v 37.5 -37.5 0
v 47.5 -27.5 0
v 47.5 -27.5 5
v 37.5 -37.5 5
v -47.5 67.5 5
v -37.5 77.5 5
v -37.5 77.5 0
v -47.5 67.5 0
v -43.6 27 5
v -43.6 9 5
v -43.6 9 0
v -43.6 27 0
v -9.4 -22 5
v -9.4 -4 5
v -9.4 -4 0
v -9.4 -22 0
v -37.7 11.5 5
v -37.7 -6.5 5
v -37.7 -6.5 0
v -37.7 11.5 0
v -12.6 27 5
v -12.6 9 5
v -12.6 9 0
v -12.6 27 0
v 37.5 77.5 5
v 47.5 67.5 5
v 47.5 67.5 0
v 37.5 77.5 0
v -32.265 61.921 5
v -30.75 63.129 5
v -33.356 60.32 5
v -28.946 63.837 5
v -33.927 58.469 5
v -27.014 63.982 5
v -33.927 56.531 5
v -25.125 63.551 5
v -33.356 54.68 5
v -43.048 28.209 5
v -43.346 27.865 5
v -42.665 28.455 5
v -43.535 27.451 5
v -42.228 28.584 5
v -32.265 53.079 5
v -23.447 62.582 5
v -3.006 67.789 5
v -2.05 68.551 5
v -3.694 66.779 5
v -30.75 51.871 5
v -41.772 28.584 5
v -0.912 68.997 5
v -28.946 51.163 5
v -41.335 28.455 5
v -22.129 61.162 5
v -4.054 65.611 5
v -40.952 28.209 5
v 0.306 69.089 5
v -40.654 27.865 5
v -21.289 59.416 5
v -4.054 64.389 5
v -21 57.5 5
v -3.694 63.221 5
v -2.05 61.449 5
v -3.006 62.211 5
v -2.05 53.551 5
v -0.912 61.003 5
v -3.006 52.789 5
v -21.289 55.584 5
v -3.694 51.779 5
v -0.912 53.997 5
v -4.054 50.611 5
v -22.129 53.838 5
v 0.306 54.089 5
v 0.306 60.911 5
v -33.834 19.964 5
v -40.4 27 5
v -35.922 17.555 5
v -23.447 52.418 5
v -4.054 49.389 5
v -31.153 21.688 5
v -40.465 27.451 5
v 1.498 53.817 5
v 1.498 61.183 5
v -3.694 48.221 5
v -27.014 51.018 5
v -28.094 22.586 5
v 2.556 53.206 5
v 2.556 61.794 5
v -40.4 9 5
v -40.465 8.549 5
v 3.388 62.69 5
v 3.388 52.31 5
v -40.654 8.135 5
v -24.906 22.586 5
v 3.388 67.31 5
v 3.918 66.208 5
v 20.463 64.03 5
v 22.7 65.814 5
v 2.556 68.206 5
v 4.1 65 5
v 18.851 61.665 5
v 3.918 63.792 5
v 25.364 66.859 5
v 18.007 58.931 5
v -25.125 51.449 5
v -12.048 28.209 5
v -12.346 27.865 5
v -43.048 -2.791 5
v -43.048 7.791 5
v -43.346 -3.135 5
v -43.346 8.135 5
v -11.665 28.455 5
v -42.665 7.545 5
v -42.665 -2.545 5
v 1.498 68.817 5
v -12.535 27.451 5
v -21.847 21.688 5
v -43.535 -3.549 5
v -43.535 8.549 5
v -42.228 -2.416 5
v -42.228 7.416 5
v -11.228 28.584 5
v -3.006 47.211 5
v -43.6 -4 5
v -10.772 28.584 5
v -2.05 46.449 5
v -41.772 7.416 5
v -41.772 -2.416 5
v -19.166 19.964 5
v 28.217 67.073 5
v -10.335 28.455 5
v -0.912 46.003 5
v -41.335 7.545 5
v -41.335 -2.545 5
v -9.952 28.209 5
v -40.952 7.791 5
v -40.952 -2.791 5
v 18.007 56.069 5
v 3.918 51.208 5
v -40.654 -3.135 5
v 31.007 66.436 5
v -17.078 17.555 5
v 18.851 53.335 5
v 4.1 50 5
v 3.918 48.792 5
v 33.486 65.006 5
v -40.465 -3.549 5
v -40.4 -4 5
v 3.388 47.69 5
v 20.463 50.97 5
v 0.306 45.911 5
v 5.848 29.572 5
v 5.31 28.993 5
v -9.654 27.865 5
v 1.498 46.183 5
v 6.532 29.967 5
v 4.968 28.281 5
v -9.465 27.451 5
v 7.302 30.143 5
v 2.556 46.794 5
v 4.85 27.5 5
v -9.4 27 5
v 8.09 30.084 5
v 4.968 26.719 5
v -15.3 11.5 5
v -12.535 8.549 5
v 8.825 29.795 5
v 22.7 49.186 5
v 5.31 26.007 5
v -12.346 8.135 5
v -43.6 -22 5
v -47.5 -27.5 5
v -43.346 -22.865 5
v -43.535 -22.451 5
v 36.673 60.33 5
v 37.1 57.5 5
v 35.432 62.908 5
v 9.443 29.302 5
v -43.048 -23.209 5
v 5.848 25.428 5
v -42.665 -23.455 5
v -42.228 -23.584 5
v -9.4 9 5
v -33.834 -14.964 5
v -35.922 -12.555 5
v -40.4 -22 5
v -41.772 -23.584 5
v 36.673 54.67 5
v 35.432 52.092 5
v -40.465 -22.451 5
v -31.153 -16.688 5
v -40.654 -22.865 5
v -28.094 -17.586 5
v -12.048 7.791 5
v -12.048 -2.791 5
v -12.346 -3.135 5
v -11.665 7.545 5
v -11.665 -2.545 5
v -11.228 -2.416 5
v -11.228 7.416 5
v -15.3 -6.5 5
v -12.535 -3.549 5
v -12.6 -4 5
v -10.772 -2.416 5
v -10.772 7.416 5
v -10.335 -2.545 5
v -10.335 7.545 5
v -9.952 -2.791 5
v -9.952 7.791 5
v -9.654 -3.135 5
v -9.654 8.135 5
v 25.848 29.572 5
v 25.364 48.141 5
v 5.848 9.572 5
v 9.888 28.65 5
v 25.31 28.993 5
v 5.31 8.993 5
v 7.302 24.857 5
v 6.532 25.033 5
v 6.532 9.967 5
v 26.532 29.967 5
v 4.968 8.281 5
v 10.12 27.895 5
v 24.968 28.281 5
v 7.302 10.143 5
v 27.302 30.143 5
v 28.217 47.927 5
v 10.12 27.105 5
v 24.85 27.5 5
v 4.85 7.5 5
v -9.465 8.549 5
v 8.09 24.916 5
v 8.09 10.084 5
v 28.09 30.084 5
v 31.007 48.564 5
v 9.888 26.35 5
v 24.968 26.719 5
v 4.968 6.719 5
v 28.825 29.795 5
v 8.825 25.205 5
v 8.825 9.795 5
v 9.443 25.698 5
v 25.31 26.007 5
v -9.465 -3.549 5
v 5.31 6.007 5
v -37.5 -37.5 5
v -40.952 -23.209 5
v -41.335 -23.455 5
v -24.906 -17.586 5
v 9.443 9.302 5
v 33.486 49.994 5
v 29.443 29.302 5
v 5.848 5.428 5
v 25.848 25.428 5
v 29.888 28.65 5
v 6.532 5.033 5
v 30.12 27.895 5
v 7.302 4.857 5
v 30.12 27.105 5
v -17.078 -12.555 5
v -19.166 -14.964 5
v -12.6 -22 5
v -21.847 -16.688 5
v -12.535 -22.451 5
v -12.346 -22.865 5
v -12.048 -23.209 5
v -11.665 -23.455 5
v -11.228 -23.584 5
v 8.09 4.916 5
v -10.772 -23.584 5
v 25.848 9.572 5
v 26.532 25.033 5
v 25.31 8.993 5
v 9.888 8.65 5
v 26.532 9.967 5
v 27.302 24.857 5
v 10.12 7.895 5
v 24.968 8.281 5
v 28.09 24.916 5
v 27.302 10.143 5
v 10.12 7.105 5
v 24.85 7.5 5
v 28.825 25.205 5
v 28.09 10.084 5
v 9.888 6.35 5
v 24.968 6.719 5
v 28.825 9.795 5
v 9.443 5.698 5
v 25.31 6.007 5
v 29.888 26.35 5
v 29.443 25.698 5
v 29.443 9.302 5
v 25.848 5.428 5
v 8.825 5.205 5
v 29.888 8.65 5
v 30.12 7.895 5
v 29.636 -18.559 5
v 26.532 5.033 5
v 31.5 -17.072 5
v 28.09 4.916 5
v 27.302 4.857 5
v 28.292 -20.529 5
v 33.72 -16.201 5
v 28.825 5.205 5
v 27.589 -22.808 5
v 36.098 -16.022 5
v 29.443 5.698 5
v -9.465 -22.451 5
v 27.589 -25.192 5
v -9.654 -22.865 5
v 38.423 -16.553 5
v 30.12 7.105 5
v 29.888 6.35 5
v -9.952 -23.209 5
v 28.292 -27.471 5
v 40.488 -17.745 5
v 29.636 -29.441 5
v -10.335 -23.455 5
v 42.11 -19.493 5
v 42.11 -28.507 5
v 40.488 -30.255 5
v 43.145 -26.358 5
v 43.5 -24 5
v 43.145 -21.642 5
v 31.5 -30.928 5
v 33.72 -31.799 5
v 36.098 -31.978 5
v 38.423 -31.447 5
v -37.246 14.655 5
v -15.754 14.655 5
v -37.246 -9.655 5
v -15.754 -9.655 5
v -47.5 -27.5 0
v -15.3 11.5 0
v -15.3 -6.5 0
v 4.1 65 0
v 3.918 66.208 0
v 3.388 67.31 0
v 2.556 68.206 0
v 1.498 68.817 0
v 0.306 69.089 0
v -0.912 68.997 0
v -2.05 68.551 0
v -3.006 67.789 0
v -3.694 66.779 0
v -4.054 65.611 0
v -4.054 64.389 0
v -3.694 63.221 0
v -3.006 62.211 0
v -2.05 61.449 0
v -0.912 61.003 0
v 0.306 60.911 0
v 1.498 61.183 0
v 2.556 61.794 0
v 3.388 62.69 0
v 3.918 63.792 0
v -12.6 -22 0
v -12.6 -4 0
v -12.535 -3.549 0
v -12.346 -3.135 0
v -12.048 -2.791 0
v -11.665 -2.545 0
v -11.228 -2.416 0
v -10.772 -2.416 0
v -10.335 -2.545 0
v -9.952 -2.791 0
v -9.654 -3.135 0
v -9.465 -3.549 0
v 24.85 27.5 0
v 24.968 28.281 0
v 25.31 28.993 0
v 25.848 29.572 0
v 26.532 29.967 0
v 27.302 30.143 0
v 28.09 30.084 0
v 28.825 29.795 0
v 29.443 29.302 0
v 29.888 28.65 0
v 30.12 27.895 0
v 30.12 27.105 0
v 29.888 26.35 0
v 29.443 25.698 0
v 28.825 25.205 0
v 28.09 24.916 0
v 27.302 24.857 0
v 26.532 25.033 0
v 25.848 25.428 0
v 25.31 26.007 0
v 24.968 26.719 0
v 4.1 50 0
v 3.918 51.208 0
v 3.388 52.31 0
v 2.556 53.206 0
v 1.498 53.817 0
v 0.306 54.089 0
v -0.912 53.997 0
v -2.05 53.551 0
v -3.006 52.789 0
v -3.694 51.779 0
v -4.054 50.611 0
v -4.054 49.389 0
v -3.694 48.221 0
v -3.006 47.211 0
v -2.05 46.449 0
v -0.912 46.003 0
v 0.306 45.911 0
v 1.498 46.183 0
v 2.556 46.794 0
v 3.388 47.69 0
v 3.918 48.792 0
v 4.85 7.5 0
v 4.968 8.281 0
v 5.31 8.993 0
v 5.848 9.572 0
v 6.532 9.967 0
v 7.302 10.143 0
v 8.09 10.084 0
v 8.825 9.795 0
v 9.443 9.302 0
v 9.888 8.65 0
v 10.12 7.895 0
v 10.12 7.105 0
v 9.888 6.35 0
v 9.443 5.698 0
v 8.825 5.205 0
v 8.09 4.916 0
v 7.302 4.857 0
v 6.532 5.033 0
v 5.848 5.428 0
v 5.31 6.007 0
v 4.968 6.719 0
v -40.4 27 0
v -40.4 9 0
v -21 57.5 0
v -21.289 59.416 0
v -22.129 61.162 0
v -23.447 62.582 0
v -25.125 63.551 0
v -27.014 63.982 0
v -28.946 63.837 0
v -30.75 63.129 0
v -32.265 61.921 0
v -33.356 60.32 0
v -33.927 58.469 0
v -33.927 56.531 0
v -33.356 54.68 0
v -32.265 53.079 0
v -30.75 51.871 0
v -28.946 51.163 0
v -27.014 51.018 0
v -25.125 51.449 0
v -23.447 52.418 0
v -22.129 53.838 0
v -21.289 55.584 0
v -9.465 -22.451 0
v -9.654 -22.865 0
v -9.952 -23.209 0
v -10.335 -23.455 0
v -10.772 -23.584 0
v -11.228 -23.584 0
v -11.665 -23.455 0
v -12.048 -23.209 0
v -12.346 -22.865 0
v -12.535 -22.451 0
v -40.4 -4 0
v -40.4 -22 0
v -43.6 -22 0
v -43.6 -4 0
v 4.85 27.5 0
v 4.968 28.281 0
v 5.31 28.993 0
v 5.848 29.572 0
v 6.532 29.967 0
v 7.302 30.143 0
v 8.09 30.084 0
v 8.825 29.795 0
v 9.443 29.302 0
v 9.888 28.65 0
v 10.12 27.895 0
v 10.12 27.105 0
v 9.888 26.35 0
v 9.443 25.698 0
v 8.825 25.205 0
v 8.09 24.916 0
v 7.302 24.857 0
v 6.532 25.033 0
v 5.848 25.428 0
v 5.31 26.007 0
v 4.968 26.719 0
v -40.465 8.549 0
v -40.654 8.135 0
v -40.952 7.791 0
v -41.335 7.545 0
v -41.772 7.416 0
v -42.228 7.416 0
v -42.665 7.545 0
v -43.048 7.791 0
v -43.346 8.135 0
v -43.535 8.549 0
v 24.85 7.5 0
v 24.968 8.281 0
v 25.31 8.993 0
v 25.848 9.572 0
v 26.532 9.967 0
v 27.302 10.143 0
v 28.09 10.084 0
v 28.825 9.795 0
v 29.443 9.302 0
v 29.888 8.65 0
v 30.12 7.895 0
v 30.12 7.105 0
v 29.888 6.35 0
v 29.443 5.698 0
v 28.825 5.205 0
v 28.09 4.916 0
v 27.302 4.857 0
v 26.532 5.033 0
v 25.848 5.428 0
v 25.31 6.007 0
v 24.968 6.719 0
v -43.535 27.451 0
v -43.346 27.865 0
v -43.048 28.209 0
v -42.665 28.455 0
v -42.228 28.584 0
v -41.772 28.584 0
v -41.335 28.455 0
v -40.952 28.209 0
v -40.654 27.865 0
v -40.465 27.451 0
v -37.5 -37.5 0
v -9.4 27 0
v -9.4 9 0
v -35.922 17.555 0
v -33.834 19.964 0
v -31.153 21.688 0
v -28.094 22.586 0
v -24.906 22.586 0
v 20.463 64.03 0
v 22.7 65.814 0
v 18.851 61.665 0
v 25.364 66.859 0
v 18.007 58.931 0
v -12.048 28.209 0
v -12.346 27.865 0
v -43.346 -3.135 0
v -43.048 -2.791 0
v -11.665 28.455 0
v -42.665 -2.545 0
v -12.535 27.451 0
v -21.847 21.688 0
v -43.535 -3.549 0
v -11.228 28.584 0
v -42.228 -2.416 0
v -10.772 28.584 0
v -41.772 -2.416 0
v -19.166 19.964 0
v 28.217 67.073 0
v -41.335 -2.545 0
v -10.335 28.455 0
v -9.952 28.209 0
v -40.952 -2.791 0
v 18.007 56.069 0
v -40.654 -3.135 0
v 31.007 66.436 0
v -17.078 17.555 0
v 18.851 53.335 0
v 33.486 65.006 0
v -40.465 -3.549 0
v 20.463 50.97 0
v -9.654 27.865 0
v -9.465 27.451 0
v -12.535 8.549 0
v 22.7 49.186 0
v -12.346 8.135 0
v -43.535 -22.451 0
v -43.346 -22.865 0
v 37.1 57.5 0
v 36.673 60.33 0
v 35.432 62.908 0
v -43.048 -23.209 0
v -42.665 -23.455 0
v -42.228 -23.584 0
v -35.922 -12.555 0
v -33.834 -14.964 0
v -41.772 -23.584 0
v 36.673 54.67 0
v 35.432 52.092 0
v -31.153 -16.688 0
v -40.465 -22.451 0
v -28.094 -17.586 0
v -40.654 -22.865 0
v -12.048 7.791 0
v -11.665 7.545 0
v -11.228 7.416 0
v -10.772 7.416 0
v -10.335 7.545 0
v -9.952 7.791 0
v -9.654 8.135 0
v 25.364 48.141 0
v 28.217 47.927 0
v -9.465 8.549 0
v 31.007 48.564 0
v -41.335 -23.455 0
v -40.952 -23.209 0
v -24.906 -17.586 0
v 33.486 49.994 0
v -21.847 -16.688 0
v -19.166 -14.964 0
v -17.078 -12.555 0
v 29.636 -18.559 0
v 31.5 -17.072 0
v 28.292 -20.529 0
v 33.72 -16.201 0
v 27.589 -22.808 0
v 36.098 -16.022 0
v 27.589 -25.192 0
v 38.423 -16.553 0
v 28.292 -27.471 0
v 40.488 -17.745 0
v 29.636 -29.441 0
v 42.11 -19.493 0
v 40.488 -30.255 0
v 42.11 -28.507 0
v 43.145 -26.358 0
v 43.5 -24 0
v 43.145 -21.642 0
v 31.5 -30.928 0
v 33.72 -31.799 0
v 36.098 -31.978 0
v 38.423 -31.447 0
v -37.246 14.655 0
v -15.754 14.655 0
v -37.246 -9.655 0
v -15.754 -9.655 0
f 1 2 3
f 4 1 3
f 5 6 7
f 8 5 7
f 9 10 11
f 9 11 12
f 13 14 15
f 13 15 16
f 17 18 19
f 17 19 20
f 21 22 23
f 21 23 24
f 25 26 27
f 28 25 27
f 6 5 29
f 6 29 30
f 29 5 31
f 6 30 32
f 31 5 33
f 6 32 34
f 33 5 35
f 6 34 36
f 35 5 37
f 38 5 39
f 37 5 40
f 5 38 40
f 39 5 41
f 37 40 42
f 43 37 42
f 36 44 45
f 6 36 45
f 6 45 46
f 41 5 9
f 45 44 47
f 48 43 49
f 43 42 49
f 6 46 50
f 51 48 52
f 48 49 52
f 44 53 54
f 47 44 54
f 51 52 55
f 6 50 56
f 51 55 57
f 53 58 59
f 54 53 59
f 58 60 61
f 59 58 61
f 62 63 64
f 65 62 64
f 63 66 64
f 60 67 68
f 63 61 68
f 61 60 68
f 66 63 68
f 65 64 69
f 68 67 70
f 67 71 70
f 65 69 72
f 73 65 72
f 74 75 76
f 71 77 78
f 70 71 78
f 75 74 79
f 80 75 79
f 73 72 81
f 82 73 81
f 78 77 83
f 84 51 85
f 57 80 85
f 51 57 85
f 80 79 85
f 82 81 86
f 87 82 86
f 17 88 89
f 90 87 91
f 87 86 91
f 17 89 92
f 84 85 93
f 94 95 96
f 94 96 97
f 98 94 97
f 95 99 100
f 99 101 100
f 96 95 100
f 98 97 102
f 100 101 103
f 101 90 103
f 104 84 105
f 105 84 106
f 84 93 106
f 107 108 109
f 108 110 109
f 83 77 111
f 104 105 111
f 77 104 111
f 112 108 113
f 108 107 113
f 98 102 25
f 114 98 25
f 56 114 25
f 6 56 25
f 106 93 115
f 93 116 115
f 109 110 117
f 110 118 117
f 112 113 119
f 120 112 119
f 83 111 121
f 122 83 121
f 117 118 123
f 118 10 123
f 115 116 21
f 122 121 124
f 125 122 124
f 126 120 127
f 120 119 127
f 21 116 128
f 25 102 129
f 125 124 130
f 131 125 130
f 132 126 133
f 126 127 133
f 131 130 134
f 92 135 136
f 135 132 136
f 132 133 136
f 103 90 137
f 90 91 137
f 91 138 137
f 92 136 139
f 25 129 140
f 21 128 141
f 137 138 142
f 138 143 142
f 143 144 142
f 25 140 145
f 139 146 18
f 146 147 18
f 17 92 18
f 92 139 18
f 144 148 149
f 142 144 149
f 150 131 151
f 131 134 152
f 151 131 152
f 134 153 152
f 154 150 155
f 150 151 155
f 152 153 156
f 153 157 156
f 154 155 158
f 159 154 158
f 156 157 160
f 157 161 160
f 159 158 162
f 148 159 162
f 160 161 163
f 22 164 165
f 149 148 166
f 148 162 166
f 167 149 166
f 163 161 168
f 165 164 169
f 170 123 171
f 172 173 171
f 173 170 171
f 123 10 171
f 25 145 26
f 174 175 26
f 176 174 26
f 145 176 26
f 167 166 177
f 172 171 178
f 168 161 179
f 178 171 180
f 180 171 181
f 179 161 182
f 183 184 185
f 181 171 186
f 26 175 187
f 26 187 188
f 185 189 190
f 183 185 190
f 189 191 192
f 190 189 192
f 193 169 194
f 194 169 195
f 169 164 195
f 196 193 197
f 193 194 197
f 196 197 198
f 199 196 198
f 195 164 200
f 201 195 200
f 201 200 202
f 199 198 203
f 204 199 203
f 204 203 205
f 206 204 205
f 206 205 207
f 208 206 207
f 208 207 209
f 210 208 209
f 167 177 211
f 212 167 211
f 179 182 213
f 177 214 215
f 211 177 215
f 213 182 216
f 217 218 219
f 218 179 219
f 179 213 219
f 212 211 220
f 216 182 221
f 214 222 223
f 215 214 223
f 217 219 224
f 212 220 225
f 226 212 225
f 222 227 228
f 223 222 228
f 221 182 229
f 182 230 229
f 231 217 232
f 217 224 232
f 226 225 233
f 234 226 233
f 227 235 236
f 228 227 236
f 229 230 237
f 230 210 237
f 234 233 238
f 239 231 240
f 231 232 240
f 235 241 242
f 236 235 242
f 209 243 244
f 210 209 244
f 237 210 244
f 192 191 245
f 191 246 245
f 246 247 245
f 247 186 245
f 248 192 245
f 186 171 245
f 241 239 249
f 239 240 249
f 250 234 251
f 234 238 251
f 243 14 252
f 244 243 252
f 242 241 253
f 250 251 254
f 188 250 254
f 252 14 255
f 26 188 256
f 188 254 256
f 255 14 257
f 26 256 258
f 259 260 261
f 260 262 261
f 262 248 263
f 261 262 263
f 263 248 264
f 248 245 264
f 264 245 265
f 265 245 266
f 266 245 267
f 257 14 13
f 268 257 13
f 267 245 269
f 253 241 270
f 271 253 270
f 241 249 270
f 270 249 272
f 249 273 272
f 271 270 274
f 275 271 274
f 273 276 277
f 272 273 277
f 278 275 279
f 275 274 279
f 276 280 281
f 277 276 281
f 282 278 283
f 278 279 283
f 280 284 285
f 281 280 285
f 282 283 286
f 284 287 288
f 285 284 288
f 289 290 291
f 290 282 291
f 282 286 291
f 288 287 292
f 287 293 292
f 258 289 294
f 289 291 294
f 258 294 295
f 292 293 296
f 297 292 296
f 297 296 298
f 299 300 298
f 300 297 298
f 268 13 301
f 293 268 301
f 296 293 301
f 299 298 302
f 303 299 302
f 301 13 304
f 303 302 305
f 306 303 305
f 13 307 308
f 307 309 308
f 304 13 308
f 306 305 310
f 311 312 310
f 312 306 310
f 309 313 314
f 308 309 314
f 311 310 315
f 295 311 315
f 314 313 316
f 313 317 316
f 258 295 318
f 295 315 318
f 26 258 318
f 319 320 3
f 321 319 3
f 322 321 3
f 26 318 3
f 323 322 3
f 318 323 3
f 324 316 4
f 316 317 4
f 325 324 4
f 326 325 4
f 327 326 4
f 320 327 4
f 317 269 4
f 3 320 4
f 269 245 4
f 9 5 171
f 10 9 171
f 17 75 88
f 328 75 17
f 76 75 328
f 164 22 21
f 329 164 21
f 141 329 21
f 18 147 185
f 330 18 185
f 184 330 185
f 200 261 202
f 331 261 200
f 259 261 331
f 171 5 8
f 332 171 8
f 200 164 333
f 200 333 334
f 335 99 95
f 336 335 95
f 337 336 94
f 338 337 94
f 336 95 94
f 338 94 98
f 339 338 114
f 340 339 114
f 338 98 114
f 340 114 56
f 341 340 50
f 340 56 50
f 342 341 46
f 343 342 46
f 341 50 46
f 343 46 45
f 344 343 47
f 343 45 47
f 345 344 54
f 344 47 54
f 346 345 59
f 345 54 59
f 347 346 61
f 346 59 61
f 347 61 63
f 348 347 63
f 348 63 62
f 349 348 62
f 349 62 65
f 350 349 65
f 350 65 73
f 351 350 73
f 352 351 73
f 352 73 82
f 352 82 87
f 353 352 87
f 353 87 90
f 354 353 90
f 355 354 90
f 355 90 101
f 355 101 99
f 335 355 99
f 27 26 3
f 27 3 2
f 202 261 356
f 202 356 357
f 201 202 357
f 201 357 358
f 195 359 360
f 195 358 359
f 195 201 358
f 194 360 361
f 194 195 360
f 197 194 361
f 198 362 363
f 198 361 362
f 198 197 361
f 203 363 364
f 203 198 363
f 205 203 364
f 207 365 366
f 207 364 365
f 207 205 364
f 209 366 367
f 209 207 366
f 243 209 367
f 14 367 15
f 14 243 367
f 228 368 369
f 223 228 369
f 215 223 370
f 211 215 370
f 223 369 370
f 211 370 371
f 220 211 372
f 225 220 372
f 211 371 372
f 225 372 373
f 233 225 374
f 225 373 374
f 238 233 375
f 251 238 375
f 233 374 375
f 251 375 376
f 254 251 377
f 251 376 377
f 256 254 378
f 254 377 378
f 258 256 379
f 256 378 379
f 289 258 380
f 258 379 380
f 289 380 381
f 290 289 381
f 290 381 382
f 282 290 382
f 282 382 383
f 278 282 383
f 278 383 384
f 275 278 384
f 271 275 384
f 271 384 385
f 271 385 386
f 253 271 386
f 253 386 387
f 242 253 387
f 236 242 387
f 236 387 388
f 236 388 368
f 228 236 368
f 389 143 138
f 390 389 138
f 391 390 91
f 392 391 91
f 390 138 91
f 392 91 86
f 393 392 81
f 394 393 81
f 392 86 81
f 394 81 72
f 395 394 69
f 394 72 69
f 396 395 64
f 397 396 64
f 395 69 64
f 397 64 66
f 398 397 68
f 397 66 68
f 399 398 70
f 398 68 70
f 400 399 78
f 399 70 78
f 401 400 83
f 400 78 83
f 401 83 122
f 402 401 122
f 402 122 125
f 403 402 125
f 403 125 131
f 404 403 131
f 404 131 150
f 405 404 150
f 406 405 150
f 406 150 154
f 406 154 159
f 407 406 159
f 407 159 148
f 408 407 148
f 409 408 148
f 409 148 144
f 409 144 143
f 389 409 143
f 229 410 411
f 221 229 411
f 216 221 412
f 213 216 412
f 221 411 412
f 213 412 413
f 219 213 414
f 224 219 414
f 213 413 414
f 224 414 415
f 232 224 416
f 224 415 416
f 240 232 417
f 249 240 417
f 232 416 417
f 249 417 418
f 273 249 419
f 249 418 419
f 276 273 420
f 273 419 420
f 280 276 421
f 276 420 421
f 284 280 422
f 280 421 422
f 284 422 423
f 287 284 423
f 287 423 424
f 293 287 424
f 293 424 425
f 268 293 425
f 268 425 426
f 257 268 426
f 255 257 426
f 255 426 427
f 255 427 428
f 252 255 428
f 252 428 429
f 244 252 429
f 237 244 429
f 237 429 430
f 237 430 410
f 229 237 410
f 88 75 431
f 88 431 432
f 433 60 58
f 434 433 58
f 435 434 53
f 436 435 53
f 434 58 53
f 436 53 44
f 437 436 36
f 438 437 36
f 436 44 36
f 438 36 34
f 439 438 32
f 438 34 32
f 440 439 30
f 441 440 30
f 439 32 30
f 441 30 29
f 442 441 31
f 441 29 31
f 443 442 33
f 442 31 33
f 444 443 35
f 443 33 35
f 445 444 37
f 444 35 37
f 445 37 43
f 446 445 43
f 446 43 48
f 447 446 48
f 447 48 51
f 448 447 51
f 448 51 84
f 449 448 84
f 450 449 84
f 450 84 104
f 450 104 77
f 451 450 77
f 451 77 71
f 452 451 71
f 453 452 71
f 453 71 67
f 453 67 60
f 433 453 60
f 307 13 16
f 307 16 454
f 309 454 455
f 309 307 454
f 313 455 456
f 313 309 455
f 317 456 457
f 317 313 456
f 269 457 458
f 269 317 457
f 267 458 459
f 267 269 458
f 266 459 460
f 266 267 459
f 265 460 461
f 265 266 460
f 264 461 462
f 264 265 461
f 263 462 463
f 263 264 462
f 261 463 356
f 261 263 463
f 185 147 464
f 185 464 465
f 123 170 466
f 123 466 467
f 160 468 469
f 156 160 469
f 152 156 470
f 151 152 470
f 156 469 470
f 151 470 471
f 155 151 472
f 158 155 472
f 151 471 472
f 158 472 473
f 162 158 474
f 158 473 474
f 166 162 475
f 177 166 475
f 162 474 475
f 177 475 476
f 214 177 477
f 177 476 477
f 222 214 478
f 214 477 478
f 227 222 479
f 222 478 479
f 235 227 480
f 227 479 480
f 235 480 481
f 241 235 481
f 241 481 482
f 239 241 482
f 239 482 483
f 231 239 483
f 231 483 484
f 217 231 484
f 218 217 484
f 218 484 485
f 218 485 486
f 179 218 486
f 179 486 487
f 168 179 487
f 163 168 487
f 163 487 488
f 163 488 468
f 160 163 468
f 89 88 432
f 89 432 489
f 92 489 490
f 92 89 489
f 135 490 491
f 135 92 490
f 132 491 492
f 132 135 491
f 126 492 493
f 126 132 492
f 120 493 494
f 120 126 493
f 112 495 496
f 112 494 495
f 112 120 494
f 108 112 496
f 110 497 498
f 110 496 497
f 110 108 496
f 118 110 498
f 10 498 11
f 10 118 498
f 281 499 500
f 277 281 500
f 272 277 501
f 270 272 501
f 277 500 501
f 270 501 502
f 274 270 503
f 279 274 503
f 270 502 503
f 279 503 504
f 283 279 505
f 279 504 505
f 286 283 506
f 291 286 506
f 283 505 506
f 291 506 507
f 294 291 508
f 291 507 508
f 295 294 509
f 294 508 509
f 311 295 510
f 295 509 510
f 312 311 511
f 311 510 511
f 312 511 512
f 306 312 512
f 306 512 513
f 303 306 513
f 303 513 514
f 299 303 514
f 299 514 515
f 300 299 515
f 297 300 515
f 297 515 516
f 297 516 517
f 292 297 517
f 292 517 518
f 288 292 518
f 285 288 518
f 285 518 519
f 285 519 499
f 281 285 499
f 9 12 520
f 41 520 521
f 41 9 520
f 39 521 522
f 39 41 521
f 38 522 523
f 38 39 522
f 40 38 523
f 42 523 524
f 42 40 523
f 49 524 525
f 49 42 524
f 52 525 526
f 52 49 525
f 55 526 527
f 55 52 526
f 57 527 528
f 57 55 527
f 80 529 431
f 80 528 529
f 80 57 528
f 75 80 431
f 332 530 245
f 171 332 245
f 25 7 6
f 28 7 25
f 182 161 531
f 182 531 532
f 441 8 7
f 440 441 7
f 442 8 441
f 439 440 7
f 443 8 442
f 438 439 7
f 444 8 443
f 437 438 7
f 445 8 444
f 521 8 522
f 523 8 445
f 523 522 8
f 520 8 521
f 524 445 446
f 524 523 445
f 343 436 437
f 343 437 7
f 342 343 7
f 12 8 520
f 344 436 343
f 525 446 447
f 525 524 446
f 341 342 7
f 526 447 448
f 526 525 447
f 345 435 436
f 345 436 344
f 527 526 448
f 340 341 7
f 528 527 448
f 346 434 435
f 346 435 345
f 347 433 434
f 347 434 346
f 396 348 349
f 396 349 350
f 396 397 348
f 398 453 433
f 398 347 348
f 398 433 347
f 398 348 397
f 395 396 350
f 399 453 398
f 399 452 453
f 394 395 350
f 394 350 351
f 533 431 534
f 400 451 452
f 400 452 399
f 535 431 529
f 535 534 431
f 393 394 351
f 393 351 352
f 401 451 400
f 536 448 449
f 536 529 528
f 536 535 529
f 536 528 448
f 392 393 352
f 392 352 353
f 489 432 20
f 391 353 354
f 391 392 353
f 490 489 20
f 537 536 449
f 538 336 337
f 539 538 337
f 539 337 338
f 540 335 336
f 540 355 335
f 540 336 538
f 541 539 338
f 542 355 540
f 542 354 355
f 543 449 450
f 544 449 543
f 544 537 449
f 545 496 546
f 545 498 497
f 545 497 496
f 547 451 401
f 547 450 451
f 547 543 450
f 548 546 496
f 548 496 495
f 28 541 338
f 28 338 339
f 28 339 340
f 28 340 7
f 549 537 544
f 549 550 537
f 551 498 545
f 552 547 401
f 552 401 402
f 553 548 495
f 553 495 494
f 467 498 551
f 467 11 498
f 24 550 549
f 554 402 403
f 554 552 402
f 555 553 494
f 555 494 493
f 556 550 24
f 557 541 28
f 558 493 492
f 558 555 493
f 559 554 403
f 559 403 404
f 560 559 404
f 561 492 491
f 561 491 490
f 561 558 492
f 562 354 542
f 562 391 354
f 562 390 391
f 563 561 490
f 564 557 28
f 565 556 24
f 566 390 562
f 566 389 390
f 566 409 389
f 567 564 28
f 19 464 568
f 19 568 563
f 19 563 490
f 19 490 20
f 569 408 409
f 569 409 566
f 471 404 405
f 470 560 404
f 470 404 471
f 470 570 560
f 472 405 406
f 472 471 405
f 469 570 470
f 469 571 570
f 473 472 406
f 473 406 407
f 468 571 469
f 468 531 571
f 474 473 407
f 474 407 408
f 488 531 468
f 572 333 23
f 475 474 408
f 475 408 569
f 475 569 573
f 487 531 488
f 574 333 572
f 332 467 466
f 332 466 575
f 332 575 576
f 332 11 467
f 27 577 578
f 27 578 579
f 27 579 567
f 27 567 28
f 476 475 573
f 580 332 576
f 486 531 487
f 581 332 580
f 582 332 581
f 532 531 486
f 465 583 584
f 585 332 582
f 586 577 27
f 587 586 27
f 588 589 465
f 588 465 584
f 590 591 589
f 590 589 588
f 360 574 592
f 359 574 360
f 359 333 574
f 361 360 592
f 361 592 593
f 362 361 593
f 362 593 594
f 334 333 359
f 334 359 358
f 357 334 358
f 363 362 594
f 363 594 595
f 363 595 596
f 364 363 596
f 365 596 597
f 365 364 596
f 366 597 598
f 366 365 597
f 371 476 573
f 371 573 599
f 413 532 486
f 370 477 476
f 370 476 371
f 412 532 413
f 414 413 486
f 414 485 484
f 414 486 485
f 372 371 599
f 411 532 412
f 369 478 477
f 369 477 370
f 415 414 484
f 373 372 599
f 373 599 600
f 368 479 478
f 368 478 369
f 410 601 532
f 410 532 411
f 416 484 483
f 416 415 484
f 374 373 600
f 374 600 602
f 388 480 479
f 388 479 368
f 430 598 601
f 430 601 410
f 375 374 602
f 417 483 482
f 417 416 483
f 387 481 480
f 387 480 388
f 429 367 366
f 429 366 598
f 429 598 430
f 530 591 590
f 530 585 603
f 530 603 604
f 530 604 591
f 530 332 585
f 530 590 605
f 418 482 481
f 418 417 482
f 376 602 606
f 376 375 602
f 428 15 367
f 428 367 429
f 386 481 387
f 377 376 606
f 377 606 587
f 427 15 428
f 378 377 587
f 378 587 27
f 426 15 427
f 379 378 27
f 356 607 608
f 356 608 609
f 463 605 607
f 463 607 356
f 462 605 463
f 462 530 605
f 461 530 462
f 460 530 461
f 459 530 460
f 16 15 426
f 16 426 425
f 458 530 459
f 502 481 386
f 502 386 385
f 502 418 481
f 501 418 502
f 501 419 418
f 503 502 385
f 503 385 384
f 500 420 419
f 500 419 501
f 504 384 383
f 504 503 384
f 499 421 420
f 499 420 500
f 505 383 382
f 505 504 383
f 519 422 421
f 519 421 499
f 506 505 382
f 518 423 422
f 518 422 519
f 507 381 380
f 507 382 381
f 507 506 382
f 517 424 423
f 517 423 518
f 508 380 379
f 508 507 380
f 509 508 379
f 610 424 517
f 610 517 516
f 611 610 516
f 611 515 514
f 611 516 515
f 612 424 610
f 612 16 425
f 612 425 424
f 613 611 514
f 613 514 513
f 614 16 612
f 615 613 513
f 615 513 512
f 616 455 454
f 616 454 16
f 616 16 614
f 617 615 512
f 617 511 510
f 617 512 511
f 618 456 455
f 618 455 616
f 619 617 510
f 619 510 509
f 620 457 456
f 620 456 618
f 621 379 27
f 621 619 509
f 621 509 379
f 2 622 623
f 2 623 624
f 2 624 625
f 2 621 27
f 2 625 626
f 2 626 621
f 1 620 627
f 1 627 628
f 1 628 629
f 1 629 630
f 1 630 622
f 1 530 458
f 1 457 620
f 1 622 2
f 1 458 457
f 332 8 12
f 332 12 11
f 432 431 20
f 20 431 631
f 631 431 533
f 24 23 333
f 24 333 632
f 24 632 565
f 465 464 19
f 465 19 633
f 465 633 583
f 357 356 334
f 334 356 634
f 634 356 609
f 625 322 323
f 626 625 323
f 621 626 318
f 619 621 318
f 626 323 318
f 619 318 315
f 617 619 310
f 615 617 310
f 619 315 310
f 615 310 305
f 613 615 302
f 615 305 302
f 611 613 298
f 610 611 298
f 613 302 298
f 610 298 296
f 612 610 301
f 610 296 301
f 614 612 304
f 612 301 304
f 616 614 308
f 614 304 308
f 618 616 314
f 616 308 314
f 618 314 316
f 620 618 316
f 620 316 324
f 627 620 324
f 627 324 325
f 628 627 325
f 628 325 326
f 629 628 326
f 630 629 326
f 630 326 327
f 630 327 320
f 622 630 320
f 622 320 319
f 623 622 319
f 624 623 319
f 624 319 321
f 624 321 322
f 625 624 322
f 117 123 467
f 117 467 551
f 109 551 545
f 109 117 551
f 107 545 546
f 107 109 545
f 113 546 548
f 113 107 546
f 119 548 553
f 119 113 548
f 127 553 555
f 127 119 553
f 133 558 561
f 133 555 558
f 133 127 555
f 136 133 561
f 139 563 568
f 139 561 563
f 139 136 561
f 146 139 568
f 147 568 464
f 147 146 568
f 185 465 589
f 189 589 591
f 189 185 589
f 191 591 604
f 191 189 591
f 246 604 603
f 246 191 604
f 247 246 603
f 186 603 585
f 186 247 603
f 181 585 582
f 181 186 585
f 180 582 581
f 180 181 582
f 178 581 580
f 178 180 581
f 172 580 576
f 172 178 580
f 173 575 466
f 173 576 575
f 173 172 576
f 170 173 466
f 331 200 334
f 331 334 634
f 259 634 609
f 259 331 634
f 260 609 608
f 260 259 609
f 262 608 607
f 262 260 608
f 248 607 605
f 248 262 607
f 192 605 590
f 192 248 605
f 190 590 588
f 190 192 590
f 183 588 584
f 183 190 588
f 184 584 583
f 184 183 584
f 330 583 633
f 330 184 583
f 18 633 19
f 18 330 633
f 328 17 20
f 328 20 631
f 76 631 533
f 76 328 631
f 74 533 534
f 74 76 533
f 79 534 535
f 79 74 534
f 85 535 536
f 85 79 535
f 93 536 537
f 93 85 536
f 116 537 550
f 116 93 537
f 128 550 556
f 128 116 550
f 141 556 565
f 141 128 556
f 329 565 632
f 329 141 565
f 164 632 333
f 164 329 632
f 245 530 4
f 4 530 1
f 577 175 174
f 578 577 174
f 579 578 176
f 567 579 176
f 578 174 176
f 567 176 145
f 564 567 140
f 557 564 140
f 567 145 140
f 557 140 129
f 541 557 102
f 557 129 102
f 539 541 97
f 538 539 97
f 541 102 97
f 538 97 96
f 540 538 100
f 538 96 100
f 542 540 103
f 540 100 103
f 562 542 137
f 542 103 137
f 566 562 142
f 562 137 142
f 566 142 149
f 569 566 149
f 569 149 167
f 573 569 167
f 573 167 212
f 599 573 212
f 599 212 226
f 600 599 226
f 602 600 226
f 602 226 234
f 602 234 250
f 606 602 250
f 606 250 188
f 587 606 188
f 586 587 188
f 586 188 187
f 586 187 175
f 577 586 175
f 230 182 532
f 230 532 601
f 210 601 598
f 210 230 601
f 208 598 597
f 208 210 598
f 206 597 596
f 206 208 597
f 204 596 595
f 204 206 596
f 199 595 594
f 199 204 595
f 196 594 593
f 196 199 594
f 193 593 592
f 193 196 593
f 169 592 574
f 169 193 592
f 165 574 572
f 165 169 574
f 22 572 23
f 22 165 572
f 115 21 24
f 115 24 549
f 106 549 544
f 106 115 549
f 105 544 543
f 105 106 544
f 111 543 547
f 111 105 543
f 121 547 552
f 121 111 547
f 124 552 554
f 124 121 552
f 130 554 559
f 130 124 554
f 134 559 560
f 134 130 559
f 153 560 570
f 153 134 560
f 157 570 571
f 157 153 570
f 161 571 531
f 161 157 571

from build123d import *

# Parameters (mm, degrees)
SKETCH_1_W          = 95
SKETCH_1_H          = 75
EXTRUDE_1_DEPTH     = 5
HOLE_WIZARD_M5_1_D  = 5.3
CUT_EXTRUDE_2_DEPTH = 6
CUT_EXTRUDE_3_REACH = 7
SKETCH_4_R          = 8
SKETCH_8_W          = 95
SKETCH_8_H          = 5
EXTRUDE_2_DEPTH     = 40
CUT_EXTRUDE_4_REACH = 7
SKETCH_9_R          = 9.6
CUT_EXTRUDE_5_REACH = 7
SKETCH_10_R         = 4.1
CUT_EXTRUDE_6_REACH = 7
SKETCH_11_R         = 6.5
CHAMFER_2_SIZE      = 10


with BuildPart() as part:
    # 草圖1 → 填料-伸長1 (new body)
    with BuildSketch(Plane.XY):
        Rectangle(SKETCH_1_W, SKETCH_1_H)
    extrude(amount=EXTRUDE_1_DEPTH)

    # M5 餘隙孔1 (through all)
    with Locations(Plane.XY.offset(5)):
        with Locations((27.5, 27.5), (7.5, 7.5), (7.5, 27.5), (27.5, 7.5)):
            Hole(HOLE_WIZARD_M5_1_D / 2)

    # 草圖6 → 除料-伸長2 (cut, through all)
    with BuildSketch(Plane.XY.offset(5)):
        with BuildLine():
            Line((-37.7, -6.5), (-37.7, 11.5))
            ThreePointArc((-37.7, 11.5), (-26.5, 22.7), (-15.3, 11.5))
            Line((-15.3, 11.5), (-15.3, -6.5))
            ThreePointArc((-15.3, -6.5), (-26.5, -17.7), (-37.7, -6.5))
        make_face()
        with BuildLine():
            Line((-40.4, 27), (-40.4, 9))
            ThreePointArc((-40.4, 9), (-42, 7.4), (-43.6, 9))
            Line((-43.6, 9), (-43.6, 27))
            ThreePointArc((-43.6, 27), (-42, 28.6), (-40.4, 27))
        make_face()
        with BuildLine():
            Line((-9.4, 27), (-9.4, 9))
            ThreePointArc((-9.4, 9), (-11, 7.4), (-12.6, 9))
            Line((-12.6, 9), (-12.6, 27))
            ThreePointArc((-12.6, 27), (-11, 28.6), (-9.4, 27))
        make_face()
        with BuildLine():
            Line((-9.4, -4), (-9.4, -22))
            ThreePointArc((-9.4, -22), (-11, -23.6), (-12.6, -22))
            Line((-12.6, -22), (-12.6, -4))
            ThreePointArc((-12.6, -4), (-11, -2.4), (-9.4, -4))
        make_face()
        with BuildLine():
            Line((-40.4, -4), (-40.4, -22))
            ThreePointArc((-40.4, -22), (-42, -23.6), (-43.6, -22))
            Line((-43.6, -22), (-43.6, -4))
            ThreePointArc((-43.6, -4), (-42, -2.4), (-40.4, -4))
        make_face()
    extrude(amount=-CUT_EXTRUDE_2_DEPTH, mode=Mode.SUBTRACT)

    # 草圖4 → 除料-伸長3 (cut, up to next)
    with BuildSketch(Plane.XY.offset(5), mode=Mode.PRIVATE) as cut_extrude_3_sk1:
        with Locations((35.5, -24)):
            Circle(SKETCH_4_R)
    cut_extrude_3_tool1 = extrude(cut_extrude_3_sk1.sketch, amount=-CUT_EXTRUDE_3_REACH, mode=Mode.PRIVATE) & part.part
    add(cut_extrude_3_tool1.solids().sort_by_distance((35.5, -24, 5))[0], mode=Mode.SUBTRACT)

    # 草圖8 → 填料-伸長2 (add)
    with BuildSketch(Plane(origin=(0, 37.5, 0), x_dir=(1, 0, 0), z_dir=(0, 1, 0))):
        with Locations((0, -2.5)):
            Rectangle(SKETCH_8_W, SKETCH_8_H)
    extrude(amount=EXTRUDE_2_DEPTH)

    # 草圖9 → 除料-伸長4 (cut, up to next)
    with BuildSketch(Plane.XY.offset(5), mode=Mode.PRIVATE) as cut_extrude_4_sk1:
        with Locations((27.5, 57.5)):
            Circle(SKETCH_9_R)
    cut_extrude_4_tool1 = extrude(cut_extrude_4_sk1.sketch, amount=-CUT_EXTRUDE_4_REACH, mode=Mode.PRIVATE) & part.part
    add(cut_extrude_4_tool1.solids().sort_by_distance((27.5, 57.5, 5))[0], mode=Mode.SUBTRACT)

    # 草圖10 → 除料-伸長5 (cut, up to next)
    with BuildSketch(Plane.XY.offset(5), mode=Mode.PRIVATE) as cut_extrude_5_sk1:
        with Locations((0, 65)):
            Circle(SKETCH_10_R)
    cut_extrude_5_tool1 = extrude(cut_extrude_5_sk1.sketch, amount=-CUT_EXTRUDE_5_REACH, mode=Mode.PRIVATE) & part.part
    add(cut_extrude_5_tool1.solids().sort_by_distance((0, 65, 5))[0], mode=Mode.SUBTRACT)
    # 草圖10 → 除料-伸長5 (cut, up to next)
    with BuildSketch(Plane.XY.offset(5), mode=Mode.PRIVATE) as cut_extrude_5_sk2:
        with Locations((0, 50)):
            Circle(SKETCH_10_R)
    cut_extrude_5_tool2 = extrude(cut_extrude_5_sk2.sketch, amount=-CUT_EXTRUDE_5_REACH, mode=Mode.PRIVATE) & part.part
    add(cut_extrude_5_tool2.solids().sort_by_distance((0, 50, 5))[0], mode=Mode.SUBTRACT)

    # 草圖11 → 除料-伸長6 (cut, up to next)
    with BuildSketch(Plane.XY.offset(5), mode=Mode.PRIVATE) as cut_extrude_6_sk1:
        with Locations((-27.5, 57.5)):
            Circle(SKETCH_11_R)
    cut_extrude_6_tool1 = extrude(cut_extrude_6_sk1.sketch, amount=-CUT_EXTRUDE_6_REACH, mode=Mode.PRIVATE) & part.part
    add(cut_extrude_6_tool1.solids().sort_by_distance((-27.5, 57.5, 5))[0], mode=Mode.SUBTRACT)

    # 導角2
    chamfer_2_edges = [part.edges().sort_by_distance(p)[0] for p in [
        (47.5, 77.5, 2.5),
        (-47.5, 77.5, 2.5),
        (47.5, -37.5, 2.5),
        (-47.5, -37.5, 2.5),
    ]]
    chamfer(chamfer_2_edges, length=CHAMFER_2_SIZE)


solid = part.part
